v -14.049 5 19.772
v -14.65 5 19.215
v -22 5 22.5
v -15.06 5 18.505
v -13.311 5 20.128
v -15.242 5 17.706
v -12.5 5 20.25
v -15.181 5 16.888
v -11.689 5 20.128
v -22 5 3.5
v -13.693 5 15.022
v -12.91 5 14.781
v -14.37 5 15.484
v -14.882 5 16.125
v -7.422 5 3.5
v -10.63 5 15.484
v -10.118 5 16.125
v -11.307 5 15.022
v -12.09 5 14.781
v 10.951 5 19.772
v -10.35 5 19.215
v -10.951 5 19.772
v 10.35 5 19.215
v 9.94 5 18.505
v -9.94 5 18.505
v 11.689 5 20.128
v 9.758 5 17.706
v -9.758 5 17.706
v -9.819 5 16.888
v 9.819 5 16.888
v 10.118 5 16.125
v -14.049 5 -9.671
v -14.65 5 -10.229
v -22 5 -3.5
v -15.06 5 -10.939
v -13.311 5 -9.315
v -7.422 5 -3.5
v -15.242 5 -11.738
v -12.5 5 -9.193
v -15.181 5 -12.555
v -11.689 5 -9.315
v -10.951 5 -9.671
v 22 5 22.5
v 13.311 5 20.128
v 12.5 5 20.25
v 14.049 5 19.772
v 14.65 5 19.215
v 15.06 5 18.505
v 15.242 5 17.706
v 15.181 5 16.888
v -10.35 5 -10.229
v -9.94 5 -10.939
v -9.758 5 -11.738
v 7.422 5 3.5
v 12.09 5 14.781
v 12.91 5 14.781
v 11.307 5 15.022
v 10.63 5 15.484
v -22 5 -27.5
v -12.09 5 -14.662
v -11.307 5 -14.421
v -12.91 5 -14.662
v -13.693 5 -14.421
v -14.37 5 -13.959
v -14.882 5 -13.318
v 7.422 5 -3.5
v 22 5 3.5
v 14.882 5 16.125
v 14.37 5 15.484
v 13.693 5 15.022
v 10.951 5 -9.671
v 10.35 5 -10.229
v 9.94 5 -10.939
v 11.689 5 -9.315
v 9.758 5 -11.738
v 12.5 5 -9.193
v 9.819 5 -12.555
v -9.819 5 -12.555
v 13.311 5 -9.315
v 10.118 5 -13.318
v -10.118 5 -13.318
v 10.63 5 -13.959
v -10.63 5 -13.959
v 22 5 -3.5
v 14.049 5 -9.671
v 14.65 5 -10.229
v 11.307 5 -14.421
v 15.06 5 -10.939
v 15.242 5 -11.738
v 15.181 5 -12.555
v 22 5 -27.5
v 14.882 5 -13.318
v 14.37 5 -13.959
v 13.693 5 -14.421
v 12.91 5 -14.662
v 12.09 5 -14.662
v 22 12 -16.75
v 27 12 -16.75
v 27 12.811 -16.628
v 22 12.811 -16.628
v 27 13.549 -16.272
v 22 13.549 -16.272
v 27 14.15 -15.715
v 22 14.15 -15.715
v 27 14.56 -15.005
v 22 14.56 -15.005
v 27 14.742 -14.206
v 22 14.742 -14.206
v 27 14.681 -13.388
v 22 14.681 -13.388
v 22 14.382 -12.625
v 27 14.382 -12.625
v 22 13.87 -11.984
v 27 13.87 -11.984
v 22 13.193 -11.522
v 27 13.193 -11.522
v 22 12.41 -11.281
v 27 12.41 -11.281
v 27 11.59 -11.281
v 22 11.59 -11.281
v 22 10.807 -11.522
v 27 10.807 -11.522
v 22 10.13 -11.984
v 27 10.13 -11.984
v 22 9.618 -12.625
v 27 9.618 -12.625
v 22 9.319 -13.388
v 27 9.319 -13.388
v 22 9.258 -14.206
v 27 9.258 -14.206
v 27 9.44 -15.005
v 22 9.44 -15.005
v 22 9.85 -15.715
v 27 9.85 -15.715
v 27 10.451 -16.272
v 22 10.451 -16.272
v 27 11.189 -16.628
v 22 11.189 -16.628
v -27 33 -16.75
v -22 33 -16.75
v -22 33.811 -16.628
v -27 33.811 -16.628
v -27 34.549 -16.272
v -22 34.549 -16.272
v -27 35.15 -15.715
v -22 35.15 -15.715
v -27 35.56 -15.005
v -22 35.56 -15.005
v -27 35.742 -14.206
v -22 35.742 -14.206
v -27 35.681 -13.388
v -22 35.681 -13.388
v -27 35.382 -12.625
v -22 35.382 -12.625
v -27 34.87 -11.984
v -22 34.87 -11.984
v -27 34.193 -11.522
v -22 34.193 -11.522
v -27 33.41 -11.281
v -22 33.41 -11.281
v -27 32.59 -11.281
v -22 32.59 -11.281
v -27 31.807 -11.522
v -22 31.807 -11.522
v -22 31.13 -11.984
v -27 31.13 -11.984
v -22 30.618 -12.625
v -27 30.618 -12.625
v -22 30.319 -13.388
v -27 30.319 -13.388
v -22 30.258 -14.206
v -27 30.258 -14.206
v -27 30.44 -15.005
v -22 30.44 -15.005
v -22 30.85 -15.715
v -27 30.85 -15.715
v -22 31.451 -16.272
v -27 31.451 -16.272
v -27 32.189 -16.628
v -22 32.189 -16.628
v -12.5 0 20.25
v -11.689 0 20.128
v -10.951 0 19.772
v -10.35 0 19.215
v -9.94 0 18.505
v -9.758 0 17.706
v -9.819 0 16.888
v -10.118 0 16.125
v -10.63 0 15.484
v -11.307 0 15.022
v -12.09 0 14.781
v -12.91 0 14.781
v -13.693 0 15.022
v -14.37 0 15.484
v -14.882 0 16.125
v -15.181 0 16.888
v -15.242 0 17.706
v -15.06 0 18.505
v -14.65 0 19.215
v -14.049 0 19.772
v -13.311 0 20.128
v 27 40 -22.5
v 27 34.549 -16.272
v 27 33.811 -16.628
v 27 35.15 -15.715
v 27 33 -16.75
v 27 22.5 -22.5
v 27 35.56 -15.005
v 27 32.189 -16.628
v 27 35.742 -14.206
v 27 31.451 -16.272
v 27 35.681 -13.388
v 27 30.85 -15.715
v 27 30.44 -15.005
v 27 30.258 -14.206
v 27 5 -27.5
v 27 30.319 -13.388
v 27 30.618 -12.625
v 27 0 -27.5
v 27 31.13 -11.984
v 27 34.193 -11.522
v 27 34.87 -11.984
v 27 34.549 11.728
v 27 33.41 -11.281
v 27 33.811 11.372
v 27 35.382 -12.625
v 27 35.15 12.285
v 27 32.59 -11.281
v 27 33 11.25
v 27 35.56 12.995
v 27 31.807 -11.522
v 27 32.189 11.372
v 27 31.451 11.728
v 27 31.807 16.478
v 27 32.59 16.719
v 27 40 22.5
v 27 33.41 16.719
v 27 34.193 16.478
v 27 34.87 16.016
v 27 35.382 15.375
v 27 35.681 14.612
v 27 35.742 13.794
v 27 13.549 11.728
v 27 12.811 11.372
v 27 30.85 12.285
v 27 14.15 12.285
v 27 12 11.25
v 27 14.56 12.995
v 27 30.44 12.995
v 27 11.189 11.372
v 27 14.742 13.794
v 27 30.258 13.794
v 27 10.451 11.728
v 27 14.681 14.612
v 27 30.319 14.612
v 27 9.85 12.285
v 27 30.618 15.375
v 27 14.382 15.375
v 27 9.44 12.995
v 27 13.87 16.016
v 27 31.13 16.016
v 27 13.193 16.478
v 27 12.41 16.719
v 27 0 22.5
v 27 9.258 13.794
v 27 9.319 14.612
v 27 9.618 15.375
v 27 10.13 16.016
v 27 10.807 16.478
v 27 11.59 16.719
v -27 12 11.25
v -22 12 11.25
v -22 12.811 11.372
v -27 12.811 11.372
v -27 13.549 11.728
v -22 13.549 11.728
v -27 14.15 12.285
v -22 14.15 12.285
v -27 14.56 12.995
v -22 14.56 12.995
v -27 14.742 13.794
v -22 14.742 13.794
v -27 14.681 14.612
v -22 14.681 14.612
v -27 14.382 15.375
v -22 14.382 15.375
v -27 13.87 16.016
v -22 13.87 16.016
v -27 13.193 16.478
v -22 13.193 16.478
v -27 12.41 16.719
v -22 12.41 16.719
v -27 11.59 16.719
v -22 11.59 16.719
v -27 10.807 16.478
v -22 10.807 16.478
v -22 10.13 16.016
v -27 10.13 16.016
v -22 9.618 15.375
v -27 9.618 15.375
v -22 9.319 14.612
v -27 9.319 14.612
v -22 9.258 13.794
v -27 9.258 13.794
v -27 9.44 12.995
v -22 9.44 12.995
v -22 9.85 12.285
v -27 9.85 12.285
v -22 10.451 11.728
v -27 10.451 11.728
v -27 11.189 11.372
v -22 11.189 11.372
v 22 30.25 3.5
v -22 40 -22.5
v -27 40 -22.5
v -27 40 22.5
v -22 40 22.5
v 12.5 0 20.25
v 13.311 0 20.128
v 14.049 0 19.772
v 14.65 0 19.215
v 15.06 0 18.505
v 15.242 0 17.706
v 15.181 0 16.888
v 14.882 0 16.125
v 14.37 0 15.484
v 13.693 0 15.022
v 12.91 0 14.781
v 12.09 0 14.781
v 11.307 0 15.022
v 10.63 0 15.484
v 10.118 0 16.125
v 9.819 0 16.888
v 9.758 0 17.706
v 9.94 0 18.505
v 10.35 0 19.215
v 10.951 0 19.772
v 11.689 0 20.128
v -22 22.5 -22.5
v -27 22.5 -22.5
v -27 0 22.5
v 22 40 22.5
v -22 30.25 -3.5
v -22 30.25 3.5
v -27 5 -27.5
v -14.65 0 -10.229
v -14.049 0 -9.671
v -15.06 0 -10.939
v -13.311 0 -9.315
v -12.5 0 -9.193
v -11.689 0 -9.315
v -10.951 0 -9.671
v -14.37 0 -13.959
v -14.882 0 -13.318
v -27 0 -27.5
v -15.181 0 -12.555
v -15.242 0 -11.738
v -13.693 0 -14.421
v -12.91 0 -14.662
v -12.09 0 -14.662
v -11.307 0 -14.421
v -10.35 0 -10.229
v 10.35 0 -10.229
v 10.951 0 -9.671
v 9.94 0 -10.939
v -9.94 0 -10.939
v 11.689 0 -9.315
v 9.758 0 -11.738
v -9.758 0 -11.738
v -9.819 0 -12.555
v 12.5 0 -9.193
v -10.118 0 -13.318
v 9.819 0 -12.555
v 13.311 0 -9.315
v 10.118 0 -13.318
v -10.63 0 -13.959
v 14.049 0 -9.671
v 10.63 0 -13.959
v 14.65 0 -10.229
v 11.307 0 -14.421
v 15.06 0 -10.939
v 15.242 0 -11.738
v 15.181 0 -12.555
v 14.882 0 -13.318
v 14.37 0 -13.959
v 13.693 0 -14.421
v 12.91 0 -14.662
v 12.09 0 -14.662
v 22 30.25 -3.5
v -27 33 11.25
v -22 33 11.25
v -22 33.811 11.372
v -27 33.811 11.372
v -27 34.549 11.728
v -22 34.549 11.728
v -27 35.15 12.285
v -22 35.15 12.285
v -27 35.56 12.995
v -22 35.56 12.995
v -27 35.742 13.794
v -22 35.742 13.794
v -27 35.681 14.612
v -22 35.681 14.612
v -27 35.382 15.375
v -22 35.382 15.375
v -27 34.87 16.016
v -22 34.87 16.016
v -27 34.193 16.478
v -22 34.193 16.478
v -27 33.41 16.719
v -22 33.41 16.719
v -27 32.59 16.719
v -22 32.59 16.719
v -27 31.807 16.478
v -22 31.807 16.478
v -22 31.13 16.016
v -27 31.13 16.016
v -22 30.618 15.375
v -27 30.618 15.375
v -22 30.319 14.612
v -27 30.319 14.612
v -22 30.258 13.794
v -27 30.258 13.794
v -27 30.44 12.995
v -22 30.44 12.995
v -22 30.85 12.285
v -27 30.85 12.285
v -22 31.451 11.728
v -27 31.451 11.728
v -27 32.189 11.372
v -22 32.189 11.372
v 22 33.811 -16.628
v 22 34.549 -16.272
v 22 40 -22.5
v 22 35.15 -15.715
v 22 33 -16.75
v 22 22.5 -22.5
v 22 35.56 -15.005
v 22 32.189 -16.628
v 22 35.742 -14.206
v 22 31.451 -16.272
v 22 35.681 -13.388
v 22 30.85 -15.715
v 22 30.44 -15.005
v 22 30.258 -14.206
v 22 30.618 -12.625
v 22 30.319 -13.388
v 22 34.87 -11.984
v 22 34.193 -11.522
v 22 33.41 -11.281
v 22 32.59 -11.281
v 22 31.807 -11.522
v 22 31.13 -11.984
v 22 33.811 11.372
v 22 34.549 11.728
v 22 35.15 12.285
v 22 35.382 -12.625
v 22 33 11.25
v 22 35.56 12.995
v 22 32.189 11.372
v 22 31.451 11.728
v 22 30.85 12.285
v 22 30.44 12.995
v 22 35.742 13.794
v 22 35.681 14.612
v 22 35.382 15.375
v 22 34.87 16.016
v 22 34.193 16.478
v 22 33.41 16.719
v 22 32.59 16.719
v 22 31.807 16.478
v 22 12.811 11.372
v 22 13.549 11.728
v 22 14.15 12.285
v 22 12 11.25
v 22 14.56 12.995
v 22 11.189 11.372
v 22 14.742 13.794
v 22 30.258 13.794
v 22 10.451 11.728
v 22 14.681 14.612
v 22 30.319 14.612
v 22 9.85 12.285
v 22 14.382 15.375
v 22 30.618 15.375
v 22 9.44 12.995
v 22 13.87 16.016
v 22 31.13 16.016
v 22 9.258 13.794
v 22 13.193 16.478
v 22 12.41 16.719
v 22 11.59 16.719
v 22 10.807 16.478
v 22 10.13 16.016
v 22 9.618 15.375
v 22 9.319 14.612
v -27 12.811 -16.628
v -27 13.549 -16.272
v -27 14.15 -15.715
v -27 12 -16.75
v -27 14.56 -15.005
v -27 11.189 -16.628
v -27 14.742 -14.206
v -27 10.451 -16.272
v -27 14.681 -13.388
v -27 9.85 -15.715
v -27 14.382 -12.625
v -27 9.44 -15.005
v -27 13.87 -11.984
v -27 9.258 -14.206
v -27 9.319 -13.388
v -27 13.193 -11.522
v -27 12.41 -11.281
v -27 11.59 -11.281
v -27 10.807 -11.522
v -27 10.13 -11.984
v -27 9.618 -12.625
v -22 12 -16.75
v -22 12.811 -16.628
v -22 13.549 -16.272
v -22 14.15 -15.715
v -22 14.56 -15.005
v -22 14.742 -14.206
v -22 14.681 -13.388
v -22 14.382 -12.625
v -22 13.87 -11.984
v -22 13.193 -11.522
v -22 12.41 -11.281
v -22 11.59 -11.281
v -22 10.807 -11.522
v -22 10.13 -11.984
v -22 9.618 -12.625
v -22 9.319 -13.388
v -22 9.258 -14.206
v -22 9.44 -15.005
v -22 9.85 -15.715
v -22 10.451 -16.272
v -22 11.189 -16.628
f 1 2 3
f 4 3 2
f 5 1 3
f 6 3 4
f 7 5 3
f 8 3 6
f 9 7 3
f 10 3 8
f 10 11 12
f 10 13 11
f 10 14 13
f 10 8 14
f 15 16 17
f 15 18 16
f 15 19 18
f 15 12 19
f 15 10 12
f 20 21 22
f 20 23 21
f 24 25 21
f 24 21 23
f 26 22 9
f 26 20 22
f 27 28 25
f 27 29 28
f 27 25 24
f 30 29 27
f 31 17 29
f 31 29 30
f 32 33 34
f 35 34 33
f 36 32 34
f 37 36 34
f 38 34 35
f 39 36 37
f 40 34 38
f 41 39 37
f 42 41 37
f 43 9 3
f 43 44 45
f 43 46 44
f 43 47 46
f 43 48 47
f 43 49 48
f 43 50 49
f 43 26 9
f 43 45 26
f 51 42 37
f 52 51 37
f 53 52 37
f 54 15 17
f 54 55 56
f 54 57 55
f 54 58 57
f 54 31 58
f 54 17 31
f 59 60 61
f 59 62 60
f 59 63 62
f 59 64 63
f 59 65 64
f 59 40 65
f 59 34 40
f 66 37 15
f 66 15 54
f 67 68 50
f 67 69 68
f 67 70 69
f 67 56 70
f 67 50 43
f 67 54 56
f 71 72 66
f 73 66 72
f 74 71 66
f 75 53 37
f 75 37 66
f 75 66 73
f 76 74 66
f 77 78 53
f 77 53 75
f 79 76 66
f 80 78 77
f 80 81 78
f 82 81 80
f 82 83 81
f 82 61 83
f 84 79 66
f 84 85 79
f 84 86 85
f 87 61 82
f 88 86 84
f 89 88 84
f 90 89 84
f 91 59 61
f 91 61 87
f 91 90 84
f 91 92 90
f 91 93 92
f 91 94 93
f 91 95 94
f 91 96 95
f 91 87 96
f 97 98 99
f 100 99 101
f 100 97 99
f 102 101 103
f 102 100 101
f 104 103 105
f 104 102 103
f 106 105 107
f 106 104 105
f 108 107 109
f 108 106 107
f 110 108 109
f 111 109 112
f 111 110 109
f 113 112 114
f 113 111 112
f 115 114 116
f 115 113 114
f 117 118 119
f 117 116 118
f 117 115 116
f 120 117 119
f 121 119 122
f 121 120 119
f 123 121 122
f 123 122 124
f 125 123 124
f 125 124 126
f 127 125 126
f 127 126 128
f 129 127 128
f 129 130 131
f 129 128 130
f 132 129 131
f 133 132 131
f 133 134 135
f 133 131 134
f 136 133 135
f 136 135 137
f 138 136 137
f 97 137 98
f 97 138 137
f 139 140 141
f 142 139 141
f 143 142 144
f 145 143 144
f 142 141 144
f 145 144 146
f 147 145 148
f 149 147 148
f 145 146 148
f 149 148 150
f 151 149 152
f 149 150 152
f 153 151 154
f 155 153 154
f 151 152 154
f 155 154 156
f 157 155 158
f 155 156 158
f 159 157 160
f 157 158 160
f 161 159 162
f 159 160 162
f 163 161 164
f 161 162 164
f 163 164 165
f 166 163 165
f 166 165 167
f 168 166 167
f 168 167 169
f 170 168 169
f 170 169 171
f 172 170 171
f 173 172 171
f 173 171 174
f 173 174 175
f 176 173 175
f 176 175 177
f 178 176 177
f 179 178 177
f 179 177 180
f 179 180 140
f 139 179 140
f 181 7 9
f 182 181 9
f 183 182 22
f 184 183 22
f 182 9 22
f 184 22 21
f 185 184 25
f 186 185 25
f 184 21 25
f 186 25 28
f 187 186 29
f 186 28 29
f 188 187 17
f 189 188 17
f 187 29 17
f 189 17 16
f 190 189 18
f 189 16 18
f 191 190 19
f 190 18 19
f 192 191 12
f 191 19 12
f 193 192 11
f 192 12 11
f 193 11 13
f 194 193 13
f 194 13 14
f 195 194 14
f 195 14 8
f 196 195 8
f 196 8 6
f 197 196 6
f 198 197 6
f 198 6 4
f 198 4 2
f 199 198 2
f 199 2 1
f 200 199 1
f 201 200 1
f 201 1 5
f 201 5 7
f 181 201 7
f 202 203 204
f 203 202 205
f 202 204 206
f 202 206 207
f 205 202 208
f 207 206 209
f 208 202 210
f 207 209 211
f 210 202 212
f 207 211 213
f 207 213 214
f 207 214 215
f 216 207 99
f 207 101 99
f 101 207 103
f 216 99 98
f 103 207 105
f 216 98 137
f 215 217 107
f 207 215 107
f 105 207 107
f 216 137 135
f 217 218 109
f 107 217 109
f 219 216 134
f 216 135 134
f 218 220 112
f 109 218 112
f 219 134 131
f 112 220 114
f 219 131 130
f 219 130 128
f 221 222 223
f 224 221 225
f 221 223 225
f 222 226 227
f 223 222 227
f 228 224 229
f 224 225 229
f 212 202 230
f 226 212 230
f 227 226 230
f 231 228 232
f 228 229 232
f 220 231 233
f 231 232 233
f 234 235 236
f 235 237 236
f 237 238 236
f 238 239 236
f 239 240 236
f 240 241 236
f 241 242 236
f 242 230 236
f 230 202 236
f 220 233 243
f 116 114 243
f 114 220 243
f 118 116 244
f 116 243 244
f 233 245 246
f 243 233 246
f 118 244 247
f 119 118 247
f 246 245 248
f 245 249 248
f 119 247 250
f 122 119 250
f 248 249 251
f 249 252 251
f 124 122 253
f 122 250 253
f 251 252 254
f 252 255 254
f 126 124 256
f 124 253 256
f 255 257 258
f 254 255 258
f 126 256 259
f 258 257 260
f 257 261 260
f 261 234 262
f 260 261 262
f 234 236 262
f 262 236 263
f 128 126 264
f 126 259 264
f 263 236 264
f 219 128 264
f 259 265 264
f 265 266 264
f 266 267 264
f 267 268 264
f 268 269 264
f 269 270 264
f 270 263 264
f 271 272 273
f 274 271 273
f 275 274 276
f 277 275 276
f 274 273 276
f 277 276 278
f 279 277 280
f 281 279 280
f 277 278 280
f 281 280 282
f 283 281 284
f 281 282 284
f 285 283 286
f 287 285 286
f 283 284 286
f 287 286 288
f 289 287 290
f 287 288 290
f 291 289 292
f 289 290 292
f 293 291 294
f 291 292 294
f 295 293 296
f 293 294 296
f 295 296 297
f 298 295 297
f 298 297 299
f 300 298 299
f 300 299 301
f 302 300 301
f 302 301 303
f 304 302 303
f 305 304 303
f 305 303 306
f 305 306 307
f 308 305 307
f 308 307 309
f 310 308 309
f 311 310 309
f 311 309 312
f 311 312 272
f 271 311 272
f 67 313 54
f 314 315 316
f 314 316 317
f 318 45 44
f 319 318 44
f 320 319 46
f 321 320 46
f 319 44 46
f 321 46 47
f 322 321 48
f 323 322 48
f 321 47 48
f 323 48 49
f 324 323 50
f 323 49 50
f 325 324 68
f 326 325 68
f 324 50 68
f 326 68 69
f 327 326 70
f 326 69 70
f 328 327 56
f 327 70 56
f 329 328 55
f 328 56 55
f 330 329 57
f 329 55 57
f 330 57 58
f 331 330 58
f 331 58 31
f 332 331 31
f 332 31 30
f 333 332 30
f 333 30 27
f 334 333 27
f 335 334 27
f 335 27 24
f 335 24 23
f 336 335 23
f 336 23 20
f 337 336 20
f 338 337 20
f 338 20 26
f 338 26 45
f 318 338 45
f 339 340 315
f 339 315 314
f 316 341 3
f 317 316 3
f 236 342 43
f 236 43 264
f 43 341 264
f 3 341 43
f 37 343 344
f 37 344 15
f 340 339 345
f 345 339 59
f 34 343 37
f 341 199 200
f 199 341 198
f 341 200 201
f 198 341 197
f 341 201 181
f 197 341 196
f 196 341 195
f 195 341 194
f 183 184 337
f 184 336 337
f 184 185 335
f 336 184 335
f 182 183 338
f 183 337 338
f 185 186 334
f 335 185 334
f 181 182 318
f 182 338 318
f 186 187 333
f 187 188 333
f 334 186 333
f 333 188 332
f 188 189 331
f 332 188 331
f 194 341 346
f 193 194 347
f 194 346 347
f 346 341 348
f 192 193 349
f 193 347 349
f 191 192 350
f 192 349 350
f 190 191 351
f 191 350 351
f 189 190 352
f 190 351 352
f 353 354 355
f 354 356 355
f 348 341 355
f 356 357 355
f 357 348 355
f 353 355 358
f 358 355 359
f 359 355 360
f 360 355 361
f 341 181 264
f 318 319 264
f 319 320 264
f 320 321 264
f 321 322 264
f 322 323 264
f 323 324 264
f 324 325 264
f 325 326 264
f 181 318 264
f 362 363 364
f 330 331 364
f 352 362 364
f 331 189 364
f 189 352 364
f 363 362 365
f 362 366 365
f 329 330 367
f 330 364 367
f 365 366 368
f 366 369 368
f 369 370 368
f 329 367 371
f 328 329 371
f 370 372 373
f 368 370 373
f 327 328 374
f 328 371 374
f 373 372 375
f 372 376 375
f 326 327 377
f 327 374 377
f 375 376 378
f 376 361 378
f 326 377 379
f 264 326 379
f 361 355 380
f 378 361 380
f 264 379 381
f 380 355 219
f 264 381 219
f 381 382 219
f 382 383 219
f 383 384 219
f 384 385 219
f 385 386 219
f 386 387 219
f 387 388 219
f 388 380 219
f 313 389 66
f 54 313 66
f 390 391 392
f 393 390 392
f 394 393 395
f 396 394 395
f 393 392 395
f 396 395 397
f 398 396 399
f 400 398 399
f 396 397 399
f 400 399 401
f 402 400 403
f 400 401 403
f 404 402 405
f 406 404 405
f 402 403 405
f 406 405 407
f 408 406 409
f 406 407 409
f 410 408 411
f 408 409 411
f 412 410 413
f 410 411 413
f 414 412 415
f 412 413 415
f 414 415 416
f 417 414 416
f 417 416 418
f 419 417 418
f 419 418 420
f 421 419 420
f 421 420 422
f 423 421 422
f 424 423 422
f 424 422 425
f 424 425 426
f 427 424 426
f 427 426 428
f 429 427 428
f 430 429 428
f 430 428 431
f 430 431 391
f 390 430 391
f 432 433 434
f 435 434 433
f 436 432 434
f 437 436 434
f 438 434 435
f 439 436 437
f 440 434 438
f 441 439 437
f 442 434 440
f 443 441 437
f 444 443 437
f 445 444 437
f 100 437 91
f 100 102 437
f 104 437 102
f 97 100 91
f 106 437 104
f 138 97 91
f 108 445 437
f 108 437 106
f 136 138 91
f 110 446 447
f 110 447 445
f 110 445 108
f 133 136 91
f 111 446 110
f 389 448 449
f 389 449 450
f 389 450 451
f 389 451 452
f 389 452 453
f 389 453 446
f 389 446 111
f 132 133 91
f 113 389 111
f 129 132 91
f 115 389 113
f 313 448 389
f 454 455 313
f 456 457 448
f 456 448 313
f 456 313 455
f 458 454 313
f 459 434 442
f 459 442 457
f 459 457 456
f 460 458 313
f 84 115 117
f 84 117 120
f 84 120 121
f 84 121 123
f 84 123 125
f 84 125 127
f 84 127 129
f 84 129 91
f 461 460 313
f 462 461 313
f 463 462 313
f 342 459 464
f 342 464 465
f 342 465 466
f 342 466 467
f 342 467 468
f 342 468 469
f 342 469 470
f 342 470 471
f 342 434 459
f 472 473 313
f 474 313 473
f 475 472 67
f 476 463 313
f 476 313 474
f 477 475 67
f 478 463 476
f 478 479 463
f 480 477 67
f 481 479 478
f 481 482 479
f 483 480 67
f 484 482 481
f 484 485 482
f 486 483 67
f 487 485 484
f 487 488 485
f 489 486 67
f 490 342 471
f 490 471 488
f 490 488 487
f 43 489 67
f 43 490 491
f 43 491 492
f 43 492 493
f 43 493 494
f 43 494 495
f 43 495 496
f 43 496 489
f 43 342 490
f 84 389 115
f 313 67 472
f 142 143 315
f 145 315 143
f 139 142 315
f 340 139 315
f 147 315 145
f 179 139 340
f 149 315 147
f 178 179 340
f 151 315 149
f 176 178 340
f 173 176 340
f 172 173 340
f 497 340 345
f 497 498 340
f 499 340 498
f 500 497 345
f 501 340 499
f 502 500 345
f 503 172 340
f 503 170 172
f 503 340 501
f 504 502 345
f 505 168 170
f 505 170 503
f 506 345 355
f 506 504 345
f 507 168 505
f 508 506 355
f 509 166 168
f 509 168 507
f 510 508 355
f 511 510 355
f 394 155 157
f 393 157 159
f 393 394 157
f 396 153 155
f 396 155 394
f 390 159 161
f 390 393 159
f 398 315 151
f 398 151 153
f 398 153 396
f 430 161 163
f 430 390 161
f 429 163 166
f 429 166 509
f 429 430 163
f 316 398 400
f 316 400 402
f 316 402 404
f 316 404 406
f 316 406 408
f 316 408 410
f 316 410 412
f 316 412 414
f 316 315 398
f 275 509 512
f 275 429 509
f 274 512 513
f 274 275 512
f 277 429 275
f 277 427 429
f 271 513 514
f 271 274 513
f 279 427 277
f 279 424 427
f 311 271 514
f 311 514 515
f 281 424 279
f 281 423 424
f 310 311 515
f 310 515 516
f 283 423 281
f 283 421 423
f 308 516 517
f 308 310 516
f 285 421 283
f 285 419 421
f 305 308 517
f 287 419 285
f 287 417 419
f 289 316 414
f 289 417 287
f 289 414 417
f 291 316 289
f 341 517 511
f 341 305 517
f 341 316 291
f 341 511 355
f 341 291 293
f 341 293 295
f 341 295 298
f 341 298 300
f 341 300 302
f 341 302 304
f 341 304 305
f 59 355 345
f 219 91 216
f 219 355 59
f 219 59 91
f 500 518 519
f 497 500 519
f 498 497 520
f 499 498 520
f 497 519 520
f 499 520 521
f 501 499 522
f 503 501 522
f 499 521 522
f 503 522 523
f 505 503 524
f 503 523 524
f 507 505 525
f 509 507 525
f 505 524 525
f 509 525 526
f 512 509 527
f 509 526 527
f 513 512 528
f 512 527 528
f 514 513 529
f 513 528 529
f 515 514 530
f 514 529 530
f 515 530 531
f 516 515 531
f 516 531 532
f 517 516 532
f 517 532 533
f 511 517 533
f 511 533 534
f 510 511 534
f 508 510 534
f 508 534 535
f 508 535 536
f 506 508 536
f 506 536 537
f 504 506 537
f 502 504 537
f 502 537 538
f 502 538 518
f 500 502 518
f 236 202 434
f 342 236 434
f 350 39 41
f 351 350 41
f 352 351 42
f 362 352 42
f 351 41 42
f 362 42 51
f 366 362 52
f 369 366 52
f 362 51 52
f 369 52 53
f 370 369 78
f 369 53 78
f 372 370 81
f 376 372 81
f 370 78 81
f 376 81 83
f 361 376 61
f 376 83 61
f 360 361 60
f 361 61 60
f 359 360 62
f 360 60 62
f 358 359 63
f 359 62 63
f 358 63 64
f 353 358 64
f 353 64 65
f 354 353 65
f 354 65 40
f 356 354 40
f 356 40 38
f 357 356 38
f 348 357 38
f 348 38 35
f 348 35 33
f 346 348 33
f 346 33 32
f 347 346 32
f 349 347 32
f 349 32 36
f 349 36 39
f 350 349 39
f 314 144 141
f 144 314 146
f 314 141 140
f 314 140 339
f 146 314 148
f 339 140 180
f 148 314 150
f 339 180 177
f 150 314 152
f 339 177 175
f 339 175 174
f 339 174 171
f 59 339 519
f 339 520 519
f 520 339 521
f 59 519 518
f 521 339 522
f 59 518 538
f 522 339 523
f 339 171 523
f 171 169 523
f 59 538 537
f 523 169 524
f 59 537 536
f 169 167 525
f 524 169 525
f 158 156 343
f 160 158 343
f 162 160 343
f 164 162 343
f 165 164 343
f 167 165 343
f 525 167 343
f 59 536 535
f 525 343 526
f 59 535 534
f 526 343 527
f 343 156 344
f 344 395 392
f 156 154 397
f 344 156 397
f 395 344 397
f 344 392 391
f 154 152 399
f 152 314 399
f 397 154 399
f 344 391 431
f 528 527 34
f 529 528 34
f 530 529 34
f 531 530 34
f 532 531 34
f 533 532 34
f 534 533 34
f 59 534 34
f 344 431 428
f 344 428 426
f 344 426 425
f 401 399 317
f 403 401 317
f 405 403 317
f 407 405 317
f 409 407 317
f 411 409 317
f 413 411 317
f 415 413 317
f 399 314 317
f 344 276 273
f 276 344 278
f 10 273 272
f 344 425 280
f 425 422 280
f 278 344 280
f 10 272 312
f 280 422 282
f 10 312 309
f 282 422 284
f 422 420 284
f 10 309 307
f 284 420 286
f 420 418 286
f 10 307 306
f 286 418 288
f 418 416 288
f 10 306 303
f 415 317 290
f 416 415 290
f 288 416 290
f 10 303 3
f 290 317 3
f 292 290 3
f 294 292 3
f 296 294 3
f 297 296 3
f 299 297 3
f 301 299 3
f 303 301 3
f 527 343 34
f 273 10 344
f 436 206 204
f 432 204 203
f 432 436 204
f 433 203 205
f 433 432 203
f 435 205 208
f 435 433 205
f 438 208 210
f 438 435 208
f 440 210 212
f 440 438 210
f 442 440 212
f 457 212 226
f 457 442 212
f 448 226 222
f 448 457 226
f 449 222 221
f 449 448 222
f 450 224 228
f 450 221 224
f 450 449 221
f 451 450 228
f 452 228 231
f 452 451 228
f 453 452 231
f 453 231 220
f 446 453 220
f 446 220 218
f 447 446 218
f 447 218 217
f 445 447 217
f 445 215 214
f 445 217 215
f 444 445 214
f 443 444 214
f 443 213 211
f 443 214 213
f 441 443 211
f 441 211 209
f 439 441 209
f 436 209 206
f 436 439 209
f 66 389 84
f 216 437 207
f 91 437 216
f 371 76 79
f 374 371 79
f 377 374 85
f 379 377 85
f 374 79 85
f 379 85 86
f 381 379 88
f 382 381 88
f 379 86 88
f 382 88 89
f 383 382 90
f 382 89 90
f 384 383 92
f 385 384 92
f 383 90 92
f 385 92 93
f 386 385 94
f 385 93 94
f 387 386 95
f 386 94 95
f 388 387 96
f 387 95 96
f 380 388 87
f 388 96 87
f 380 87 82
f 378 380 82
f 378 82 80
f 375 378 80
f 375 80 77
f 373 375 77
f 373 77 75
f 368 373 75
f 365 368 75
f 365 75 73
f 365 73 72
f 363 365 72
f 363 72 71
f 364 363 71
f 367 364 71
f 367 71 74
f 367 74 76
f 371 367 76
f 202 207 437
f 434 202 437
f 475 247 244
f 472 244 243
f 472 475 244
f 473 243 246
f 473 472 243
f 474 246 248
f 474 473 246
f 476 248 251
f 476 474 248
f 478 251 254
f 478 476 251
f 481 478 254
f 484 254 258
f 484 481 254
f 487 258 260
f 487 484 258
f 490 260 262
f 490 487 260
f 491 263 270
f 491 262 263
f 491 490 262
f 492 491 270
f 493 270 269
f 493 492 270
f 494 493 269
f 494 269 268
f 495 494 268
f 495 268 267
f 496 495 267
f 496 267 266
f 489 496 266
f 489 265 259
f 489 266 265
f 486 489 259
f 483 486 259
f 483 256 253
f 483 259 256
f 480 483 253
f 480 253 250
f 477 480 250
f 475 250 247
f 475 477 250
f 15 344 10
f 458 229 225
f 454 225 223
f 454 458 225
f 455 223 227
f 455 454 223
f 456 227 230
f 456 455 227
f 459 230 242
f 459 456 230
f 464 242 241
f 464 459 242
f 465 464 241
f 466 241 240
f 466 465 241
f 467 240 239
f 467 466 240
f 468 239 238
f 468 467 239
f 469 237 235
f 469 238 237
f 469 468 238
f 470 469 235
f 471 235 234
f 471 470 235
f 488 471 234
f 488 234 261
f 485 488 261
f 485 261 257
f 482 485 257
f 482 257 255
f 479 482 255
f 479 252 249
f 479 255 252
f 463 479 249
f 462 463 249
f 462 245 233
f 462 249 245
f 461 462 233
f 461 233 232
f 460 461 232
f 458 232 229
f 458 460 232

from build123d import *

# Parameters (mm, degrees)
SKETCH1_W               = 54
SKETCH1_H               = 55
BOSS_EXTRUDE1_DEPTH     = 5
SKETCH6_W               = 5
SKETCH6_H               = 45
BOSS_EXTRUDE3_DEPTH     = 35
SKETCH7_R               = 2.75
CUT_EXTRUDE2_DEPTH      = 69.972820734
RIB1_REACH              = 74.61
SKETCH8_WALL_W          = 165.420796688
SKETCH8_WALL_H          = 5
MIRROR2_COPY_1_REACH    = 74.61
MIRROR2_COPY_1_SKETCH_W = 165.420796688
MIRROR2_COPY_1_SKETCH_H = 5
RIB4_REACH              = 57.545
SKETCH9_WALL_W          = 142.246242154
SKETCH9_WALL_H          = 7
SKETCH10_R              = 2.75
CUT_EXTRUDE3_DEPTH      = 53.060061468
SKETCH11_W              = 54
SKETCH11_H              = 5
CUT_EXTRUDE4_DEPTH      = 40


with BuildPart() as part:
    # Sketch1 → Boss-Extrude1 (new body)
    with BuildSketch(Plane(origin=(0, 0, 0), x_dir=(1, 0, 0), z_dir=(0, 1, 0))):
        Rectangle(SKETCH1_W, SKETCH1_H)
    extrude(amount=BOSS_EXTRUDE1_DEPTH)

    # Sketch6 → Boss-Extrude3 (add)
    with BuildSketch(Plane(origin=(0, 5, 0), x_dir=(1, 0, 0), z_dir=(0, 1, 0))):
        with Locations((-24.5, 0)):
            Rectangle(SKETCH6_W, SKETCH6_H)
    boss_extrude3 = extrude(amount=BOSS_EXTRUDE3_DEPTH)

    # Sketch7 → Cut-Extrude2 (cut, through all)
    with BuildSketch(Plane(origin=(-22, 0, 0), x_dir=(0, 0, -1), z_dir=(1, 0, 0))):
        with Locations((-14, 33)):
            Circle(SKETCH7_R)
        with Locations((14, 33)):
            Circle(SKETCH7_R)
        with Locations((14, 12)):
            Circle(SKETCH7_R)
        with Locations((-14, 12)):
            Circle(SKETCH7_R)
    cut_extrude2 = extrude(amount=-CUT_EXTRUDE2_DEPTH, mode=Mode.SUBTRACT)

    # Sketch8 wall → Rib1 (add, up to next)
    with BuildSketch(Plane(origin=(-27, 13.75, -25), x_dir=(0, -0.961523947641, -0.274721127897), z_dir=(0, -0.274721127897, 0.961523947641)), mode=Mode.PRIVATE) as rib1_sk1:
        with Locations((0, 2.5)):
            Rectangle(SKETCH8_WALL_W, SKETCH8_WALL_H)
    rib1_tool1 = extrude(rib1_sk1.sketch, amount=RIB1_REACH, mode=Mode.PRIVATE) - part.part
    rib1 = rib1_tool1.solids().sort_by_distance((-27, 13.75, -25))[0]
    add(rib1)

    # Mirror1: Rib1 across plane
    add(rib1.mirror(Plane.XY))

    # Mirror2: Boss-Extrude3, Cut-Extrude2, Rib1 across plane
    add(boss_extrude3.mirror(Plane(origin=(0, 0, 0), x_dir=(0, 0, 1), z_dir=(1, 0, 0))))
    add(cut_extrude2.mirror(Plane(origin=(0, 0, 0), x_dir=(0, 0, 1), z_dir=(1, 0, 0))), mode=Mode.SUBTRACT)
    add(rib1.mirror(Plane(origin=(0, 0, 0), x_dir=(0, 0, 1), z_dir=(1, 0, 0))))

    # Mirror2 copy 1 sketch → Mirror2 copy 1 (add, up to next)
    with BuildSketch(Plane(origin=(27, 13.75, 25), x_dir=(0, -0.961523947641, 0.274721127897), z_dir=(0, -0.274721127897, -0.961523947641)), mode=Mode.PRIVATE) as mirror2_copy_1_sk1:
        with Locations((0, 2.5)):
            Rectangle(MIRROR2_COPY_1_SKETCH_W, MIRROR2_COPY_1_SKETCH_H)
    mirror2_copy_1_tool1 = extrude(mirror2_copy_1_sk1.sketch, amount=MIRROR2_COPY_1_REACH, mode=Mode.PRIVATE) - part.part
    add(mirror2_copy_1_tool1.solids().sort_by_distance((27, 13.75, 25))[0])

    # Sketch9 wall → Rib4 (add, up to next)
    with BuildSketch(Plane(origin=(-14.710952852, 17.625, 0), x_dir=(0.499999999999, -0.866025403785, 0), z_dir=(0.866025403785, 0.499999999999, 0)), mode=Mode.PRIVATE) as rib4_sk1:
        Rectangle(SKETCH9_WALL_W, SKETCH9_WALL_H)
    rib4_tool1 = extrude(rib4_sk1.sketch, amount=-RIB4_REACH, mode=Mode.PRIVATE) - part.part
    rib4 = rib4_tool1.solids().sort_by_distance((-14.710952852, 17.625, 0))[0]
    add(rib4)

    # Mirror3: Rib4 across plane
    add(rib4.mirror(Plane(origin=(0, 0, 0), x_dir=(0, 0, 1), z_dir=(1, 0, 0))))

    # Sketch10 → Cut-Extrude3 (cut, through all)
    with BuildSketch(Plane(origin=(0, 5, 0), x_dir=(1, 0, 0), z_dir=(0, 1, 0))):
        with Locations(Location((12.5, 11.943211227, 0), (0, 0, 270))):
            Circle(SKETCH10_R)
        with Locations(Location((12.5, -17.5, 0), (0, 0, 270))):
            Circle(SKETCH10_R)
        with Locations(Location((-12.5, -17.5, 0), (0, 0, 270))):
            Circle(SKETCH10_R)
        with Locations(Location((-12.5, 11.943211227, 0), (0, 0, 270))):
            Circle(SKETCH10_R)
    extrude(amount=-CUT_EXTRUDE3_DEPTH, mode=Mode.SUBTRACT)

    # Sketch11 → Cut-Extrude4 (cut)
    with BuildSketch(Plane.XZ):
        with Locations((0, 25)):
            Rectangle(SKETCH11_W, SKETCH11_H)
    extrude(amount=-CUT_EXTRUDE4_DEPTH, mode=Mode.SUBTRACT)


solid = part.part
